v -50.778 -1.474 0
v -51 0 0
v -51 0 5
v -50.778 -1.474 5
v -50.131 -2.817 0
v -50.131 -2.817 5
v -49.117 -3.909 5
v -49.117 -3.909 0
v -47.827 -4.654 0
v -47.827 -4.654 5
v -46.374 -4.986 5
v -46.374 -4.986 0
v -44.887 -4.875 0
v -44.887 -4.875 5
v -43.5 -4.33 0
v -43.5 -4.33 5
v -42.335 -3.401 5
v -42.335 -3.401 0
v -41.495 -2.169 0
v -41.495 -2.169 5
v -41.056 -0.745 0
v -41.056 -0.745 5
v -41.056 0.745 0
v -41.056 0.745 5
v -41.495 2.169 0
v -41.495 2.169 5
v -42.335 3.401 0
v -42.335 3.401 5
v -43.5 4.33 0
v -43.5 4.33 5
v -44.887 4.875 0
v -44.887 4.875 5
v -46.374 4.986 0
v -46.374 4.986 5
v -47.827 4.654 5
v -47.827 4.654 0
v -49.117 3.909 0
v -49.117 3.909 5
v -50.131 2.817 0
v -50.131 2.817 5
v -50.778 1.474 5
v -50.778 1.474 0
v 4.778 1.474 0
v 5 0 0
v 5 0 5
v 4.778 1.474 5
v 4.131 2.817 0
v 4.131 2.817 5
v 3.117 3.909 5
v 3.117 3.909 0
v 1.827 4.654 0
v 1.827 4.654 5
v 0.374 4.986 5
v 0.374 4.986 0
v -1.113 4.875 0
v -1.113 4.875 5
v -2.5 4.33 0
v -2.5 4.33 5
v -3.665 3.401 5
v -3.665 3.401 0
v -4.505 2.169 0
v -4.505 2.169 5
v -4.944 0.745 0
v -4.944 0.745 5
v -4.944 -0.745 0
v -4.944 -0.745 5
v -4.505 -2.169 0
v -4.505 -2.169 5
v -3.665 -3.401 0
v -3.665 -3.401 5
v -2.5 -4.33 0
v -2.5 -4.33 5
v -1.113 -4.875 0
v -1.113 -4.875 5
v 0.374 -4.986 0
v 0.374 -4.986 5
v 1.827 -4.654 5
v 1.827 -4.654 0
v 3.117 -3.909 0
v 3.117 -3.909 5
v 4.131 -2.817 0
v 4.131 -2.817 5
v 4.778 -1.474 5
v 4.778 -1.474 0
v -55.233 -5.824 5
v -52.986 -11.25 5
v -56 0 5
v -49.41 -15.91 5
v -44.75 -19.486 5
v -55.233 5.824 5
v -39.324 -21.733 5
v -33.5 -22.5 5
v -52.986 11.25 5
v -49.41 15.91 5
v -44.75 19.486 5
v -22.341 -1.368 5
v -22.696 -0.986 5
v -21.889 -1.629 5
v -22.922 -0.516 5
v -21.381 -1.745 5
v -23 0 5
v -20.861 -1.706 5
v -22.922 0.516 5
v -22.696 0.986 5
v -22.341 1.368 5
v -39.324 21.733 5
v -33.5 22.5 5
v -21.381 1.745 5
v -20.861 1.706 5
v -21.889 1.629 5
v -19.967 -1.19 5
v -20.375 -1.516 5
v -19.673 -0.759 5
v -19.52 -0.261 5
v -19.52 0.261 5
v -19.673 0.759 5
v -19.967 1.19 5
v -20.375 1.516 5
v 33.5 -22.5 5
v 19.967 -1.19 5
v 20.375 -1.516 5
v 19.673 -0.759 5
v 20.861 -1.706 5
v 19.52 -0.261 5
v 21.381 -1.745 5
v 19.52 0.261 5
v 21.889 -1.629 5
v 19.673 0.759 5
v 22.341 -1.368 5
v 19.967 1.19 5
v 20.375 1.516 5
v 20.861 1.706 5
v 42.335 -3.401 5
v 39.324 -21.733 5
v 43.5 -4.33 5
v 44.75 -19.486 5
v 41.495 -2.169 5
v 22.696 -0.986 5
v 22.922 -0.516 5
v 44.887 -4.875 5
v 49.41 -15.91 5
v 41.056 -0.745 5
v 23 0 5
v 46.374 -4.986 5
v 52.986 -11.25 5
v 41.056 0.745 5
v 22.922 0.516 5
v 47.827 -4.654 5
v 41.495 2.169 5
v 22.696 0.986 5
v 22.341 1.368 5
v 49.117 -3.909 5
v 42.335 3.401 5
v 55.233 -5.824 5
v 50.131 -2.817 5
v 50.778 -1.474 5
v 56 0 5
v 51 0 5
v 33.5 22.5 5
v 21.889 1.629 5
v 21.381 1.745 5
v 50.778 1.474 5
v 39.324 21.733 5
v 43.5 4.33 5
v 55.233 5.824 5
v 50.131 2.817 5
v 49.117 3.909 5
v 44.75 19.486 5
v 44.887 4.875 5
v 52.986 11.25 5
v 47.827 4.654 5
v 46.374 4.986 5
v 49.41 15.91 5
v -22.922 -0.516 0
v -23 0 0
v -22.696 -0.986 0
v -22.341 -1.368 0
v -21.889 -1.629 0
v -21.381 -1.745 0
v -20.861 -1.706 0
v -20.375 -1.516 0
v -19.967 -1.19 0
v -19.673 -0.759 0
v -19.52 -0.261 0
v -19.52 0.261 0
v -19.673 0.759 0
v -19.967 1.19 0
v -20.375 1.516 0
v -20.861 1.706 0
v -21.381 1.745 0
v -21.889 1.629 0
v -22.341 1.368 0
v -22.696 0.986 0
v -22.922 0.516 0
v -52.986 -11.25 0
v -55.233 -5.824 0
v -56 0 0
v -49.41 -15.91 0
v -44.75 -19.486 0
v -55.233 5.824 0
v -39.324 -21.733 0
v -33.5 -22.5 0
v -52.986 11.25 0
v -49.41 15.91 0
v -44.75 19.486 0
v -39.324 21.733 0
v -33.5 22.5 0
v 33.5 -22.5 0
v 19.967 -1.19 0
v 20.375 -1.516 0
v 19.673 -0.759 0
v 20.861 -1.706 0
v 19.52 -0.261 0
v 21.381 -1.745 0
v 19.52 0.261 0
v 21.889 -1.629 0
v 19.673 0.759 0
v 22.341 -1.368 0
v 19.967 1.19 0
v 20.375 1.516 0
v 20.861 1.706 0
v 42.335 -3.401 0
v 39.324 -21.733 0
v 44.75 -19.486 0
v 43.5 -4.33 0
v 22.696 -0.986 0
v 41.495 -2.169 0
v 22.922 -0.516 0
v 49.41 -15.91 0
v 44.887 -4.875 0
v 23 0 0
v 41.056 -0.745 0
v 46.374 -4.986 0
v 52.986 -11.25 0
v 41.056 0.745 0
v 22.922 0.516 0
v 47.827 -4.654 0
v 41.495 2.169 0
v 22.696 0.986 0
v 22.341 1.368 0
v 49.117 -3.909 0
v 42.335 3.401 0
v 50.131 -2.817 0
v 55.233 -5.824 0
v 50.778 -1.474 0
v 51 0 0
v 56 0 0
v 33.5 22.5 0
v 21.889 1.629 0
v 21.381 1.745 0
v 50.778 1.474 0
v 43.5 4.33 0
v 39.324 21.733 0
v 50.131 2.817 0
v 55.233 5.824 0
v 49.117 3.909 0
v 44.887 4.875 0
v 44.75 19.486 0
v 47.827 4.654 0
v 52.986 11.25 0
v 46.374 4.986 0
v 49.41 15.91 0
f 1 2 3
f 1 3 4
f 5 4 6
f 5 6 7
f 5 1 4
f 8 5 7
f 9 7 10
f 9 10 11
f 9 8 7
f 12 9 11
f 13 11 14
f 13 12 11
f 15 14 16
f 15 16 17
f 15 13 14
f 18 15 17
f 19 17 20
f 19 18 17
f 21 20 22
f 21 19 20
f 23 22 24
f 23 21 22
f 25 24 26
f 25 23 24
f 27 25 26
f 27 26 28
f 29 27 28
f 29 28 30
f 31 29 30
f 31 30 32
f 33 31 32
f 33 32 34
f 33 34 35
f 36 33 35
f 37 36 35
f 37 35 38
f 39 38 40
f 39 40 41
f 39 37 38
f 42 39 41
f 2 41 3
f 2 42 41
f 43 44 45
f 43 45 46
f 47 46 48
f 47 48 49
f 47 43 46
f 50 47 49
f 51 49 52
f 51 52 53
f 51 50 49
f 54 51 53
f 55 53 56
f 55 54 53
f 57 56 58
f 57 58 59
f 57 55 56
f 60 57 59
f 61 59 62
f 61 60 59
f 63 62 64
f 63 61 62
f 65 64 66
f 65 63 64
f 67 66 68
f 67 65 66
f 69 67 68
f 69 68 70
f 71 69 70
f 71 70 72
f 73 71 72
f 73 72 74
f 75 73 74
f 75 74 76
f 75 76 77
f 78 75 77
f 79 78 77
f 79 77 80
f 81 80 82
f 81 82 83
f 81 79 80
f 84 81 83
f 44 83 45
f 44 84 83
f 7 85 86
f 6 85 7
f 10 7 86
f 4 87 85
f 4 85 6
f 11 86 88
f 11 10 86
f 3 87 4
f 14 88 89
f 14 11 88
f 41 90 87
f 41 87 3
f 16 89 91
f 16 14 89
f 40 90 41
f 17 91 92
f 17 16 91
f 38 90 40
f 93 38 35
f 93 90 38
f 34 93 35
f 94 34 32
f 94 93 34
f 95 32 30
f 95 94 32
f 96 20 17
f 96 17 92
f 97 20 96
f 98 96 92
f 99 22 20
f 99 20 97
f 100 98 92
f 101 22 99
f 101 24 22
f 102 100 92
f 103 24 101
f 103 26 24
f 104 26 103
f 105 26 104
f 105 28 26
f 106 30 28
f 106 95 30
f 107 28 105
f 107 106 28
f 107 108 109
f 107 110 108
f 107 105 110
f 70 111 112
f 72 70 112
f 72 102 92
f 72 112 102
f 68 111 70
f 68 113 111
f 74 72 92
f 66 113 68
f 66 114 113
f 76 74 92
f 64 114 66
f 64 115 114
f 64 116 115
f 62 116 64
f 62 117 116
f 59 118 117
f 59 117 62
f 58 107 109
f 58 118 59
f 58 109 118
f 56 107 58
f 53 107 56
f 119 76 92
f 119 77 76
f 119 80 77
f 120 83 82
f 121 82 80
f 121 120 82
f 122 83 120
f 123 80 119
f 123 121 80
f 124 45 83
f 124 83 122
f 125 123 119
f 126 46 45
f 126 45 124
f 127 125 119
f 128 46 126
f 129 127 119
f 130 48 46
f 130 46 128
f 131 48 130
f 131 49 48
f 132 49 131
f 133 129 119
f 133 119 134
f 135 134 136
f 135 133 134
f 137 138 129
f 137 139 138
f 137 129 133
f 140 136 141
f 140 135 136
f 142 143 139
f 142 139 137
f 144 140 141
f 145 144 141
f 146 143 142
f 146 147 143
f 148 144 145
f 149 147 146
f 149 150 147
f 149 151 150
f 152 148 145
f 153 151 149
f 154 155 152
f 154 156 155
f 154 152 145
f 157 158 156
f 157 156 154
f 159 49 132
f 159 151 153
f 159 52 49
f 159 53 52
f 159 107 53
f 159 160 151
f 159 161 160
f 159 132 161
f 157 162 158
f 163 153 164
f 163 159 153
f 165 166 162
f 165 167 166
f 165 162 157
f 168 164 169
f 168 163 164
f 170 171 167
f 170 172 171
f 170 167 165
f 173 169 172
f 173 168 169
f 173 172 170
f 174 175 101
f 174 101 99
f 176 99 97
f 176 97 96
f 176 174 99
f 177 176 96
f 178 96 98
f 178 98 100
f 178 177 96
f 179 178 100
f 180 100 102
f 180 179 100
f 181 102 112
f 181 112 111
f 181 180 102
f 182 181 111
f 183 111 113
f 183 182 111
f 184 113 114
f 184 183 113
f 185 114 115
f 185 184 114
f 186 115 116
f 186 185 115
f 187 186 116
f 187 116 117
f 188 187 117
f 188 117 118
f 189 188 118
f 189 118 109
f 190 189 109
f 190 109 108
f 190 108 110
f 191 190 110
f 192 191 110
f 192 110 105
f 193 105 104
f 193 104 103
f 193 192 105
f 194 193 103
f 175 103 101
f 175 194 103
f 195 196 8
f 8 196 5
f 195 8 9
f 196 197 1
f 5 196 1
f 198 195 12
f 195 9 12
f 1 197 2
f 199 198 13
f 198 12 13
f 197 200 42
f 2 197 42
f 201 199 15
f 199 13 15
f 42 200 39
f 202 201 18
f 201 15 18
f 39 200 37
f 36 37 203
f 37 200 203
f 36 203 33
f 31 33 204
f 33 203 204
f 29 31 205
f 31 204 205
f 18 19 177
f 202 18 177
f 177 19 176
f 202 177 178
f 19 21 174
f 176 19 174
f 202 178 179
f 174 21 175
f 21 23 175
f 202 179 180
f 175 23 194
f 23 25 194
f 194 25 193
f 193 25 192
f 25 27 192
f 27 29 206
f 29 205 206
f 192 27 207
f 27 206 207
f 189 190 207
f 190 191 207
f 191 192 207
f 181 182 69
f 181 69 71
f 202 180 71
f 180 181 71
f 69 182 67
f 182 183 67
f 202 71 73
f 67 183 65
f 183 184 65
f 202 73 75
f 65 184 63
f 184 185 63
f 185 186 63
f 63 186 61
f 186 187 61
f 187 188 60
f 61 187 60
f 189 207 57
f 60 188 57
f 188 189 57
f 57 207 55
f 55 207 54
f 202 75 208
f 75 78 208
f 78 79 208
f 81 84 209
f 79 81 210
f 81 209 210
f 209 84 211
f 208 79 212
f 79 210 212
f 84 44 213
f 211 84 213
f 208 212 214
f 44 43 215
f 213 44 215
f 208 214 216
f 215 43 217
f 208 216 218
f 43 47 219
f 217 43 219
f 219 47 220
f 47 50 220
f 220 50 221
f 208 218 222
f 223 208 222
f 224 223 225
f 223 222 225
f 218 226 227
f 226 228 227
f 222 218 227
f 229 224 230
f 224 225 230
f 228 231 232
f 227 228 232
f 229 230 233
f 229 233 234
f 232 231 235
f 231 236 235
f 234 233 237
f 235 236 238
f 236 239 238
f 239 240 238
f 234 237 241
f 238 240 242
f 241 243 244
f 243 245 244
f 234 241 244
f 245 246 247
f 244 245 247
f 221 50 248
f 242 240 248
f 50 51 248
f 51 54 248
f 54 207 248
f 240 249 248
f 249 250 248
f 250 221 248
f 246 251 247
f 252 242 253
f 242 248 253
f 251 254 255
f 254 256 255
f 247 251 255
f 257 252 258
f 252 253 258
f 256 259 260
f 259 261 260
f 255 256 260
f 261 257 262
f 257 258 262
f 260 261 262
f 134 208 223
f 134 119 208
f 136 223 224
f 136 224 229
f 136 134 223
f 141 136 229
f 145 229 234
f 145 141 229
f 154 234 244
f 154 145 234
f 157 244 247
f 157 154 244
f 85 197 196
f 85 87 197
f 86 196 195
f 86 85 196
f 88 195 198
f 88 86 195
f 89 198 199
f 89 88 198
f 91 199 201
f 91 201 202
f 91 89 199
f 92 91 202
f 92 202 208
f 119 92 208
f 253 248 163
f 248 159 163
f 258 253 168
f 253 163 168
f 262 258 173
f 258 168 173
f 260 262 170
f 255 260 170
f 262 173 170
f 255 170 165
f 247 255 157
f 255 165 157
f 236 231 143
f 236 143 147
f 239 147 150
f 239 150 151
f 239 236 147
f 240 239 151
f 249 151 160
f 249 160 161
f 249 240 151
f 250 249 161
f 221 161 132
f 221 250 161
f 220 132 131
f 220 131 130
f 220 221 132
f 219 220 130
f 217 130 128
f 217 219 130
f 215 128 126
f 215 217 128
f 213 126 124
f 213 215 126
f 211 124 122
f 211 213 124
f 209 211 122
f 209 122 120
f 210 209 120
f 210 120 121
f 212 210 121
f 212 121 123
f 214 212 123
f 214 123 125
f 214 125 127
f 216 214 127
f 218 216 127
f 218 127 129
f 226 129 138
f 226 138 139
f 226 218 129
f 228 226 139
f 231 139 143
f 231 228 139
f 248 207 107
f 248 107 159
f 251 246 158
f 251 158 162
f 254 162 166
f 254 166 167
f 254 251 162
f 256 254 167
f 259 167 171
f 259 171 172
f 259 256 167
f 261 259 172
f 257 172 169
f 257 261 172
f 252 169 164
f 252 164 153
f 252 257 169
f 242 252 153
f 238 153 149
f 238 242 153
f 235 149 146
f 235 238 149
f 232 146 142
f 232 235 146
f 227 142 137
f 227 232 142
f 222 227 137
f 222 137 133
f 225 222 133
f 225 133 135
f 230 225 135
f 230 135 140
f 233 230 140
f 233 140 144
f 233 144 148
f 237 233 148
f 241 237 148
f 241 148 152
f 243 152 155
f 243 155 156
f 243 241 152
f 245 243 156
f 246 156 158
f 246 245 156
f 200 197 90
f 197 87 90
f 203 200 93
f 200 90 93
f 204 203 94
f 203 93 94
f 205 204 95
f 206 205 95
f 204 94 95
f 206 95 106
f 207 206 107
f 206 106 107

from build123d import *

# Parameters (mm, degrees)
ESQUISSE1_W        = 112
ESQUISSE1_H        = 45
ESQUISSE1_R        = 1.75
ESQUISSE1_R_2      = 5
BOSS_EXTRU_1_DEPTH = 5
CONG_1_R           = 22.5


with BuildPart() as part:
    # Esquisse1 → Boss.-Extru.1 (new body)
    with BuildSketch(Plane.XY):
        Rectangle(ESQUISSE1_W, ESQUISSE1_H)
        with Locations((21.25, 0)):
            Circle(ESQUISSE1_R, mode=Mode.SUBTRACT)
        with Locations(Location((-21.25, 0, 0), (0, 0, 180))):
            Circle(ESQUISSE1_R, mode=Mode.SUBTRACT)
        with Locations((46, 0)):
            Circle(ESQUISSE1_R_2, mode=Mode.SUBTRACT)
        with Locations(Location((-46, 0, 0), (0, 0, 180))):
            Circle(ESQUISSE1_R_2, mode=Mode.SUBTRACT)
        Circle(ESQUISSE1_R_2, mode=Mode.SUBTRACT)
    extrude(amount=BOSS_EXTRU_1_DEPTH)

    # Congé1
    cong_1_edges = [part.edges().sort_by_distance(p)[0] for p in [
        (-56, -22.5, 2.5),
        (-56, 22.5, 2.5),
        (56, -22.5, 2.5),
        (56, 22.5, 2.5),
    ]]
    fillet(cong_1_edges, radius=CONG_1_R - 0.0001)  # a hair under: the kernel refuses the full size


solid = part.part
